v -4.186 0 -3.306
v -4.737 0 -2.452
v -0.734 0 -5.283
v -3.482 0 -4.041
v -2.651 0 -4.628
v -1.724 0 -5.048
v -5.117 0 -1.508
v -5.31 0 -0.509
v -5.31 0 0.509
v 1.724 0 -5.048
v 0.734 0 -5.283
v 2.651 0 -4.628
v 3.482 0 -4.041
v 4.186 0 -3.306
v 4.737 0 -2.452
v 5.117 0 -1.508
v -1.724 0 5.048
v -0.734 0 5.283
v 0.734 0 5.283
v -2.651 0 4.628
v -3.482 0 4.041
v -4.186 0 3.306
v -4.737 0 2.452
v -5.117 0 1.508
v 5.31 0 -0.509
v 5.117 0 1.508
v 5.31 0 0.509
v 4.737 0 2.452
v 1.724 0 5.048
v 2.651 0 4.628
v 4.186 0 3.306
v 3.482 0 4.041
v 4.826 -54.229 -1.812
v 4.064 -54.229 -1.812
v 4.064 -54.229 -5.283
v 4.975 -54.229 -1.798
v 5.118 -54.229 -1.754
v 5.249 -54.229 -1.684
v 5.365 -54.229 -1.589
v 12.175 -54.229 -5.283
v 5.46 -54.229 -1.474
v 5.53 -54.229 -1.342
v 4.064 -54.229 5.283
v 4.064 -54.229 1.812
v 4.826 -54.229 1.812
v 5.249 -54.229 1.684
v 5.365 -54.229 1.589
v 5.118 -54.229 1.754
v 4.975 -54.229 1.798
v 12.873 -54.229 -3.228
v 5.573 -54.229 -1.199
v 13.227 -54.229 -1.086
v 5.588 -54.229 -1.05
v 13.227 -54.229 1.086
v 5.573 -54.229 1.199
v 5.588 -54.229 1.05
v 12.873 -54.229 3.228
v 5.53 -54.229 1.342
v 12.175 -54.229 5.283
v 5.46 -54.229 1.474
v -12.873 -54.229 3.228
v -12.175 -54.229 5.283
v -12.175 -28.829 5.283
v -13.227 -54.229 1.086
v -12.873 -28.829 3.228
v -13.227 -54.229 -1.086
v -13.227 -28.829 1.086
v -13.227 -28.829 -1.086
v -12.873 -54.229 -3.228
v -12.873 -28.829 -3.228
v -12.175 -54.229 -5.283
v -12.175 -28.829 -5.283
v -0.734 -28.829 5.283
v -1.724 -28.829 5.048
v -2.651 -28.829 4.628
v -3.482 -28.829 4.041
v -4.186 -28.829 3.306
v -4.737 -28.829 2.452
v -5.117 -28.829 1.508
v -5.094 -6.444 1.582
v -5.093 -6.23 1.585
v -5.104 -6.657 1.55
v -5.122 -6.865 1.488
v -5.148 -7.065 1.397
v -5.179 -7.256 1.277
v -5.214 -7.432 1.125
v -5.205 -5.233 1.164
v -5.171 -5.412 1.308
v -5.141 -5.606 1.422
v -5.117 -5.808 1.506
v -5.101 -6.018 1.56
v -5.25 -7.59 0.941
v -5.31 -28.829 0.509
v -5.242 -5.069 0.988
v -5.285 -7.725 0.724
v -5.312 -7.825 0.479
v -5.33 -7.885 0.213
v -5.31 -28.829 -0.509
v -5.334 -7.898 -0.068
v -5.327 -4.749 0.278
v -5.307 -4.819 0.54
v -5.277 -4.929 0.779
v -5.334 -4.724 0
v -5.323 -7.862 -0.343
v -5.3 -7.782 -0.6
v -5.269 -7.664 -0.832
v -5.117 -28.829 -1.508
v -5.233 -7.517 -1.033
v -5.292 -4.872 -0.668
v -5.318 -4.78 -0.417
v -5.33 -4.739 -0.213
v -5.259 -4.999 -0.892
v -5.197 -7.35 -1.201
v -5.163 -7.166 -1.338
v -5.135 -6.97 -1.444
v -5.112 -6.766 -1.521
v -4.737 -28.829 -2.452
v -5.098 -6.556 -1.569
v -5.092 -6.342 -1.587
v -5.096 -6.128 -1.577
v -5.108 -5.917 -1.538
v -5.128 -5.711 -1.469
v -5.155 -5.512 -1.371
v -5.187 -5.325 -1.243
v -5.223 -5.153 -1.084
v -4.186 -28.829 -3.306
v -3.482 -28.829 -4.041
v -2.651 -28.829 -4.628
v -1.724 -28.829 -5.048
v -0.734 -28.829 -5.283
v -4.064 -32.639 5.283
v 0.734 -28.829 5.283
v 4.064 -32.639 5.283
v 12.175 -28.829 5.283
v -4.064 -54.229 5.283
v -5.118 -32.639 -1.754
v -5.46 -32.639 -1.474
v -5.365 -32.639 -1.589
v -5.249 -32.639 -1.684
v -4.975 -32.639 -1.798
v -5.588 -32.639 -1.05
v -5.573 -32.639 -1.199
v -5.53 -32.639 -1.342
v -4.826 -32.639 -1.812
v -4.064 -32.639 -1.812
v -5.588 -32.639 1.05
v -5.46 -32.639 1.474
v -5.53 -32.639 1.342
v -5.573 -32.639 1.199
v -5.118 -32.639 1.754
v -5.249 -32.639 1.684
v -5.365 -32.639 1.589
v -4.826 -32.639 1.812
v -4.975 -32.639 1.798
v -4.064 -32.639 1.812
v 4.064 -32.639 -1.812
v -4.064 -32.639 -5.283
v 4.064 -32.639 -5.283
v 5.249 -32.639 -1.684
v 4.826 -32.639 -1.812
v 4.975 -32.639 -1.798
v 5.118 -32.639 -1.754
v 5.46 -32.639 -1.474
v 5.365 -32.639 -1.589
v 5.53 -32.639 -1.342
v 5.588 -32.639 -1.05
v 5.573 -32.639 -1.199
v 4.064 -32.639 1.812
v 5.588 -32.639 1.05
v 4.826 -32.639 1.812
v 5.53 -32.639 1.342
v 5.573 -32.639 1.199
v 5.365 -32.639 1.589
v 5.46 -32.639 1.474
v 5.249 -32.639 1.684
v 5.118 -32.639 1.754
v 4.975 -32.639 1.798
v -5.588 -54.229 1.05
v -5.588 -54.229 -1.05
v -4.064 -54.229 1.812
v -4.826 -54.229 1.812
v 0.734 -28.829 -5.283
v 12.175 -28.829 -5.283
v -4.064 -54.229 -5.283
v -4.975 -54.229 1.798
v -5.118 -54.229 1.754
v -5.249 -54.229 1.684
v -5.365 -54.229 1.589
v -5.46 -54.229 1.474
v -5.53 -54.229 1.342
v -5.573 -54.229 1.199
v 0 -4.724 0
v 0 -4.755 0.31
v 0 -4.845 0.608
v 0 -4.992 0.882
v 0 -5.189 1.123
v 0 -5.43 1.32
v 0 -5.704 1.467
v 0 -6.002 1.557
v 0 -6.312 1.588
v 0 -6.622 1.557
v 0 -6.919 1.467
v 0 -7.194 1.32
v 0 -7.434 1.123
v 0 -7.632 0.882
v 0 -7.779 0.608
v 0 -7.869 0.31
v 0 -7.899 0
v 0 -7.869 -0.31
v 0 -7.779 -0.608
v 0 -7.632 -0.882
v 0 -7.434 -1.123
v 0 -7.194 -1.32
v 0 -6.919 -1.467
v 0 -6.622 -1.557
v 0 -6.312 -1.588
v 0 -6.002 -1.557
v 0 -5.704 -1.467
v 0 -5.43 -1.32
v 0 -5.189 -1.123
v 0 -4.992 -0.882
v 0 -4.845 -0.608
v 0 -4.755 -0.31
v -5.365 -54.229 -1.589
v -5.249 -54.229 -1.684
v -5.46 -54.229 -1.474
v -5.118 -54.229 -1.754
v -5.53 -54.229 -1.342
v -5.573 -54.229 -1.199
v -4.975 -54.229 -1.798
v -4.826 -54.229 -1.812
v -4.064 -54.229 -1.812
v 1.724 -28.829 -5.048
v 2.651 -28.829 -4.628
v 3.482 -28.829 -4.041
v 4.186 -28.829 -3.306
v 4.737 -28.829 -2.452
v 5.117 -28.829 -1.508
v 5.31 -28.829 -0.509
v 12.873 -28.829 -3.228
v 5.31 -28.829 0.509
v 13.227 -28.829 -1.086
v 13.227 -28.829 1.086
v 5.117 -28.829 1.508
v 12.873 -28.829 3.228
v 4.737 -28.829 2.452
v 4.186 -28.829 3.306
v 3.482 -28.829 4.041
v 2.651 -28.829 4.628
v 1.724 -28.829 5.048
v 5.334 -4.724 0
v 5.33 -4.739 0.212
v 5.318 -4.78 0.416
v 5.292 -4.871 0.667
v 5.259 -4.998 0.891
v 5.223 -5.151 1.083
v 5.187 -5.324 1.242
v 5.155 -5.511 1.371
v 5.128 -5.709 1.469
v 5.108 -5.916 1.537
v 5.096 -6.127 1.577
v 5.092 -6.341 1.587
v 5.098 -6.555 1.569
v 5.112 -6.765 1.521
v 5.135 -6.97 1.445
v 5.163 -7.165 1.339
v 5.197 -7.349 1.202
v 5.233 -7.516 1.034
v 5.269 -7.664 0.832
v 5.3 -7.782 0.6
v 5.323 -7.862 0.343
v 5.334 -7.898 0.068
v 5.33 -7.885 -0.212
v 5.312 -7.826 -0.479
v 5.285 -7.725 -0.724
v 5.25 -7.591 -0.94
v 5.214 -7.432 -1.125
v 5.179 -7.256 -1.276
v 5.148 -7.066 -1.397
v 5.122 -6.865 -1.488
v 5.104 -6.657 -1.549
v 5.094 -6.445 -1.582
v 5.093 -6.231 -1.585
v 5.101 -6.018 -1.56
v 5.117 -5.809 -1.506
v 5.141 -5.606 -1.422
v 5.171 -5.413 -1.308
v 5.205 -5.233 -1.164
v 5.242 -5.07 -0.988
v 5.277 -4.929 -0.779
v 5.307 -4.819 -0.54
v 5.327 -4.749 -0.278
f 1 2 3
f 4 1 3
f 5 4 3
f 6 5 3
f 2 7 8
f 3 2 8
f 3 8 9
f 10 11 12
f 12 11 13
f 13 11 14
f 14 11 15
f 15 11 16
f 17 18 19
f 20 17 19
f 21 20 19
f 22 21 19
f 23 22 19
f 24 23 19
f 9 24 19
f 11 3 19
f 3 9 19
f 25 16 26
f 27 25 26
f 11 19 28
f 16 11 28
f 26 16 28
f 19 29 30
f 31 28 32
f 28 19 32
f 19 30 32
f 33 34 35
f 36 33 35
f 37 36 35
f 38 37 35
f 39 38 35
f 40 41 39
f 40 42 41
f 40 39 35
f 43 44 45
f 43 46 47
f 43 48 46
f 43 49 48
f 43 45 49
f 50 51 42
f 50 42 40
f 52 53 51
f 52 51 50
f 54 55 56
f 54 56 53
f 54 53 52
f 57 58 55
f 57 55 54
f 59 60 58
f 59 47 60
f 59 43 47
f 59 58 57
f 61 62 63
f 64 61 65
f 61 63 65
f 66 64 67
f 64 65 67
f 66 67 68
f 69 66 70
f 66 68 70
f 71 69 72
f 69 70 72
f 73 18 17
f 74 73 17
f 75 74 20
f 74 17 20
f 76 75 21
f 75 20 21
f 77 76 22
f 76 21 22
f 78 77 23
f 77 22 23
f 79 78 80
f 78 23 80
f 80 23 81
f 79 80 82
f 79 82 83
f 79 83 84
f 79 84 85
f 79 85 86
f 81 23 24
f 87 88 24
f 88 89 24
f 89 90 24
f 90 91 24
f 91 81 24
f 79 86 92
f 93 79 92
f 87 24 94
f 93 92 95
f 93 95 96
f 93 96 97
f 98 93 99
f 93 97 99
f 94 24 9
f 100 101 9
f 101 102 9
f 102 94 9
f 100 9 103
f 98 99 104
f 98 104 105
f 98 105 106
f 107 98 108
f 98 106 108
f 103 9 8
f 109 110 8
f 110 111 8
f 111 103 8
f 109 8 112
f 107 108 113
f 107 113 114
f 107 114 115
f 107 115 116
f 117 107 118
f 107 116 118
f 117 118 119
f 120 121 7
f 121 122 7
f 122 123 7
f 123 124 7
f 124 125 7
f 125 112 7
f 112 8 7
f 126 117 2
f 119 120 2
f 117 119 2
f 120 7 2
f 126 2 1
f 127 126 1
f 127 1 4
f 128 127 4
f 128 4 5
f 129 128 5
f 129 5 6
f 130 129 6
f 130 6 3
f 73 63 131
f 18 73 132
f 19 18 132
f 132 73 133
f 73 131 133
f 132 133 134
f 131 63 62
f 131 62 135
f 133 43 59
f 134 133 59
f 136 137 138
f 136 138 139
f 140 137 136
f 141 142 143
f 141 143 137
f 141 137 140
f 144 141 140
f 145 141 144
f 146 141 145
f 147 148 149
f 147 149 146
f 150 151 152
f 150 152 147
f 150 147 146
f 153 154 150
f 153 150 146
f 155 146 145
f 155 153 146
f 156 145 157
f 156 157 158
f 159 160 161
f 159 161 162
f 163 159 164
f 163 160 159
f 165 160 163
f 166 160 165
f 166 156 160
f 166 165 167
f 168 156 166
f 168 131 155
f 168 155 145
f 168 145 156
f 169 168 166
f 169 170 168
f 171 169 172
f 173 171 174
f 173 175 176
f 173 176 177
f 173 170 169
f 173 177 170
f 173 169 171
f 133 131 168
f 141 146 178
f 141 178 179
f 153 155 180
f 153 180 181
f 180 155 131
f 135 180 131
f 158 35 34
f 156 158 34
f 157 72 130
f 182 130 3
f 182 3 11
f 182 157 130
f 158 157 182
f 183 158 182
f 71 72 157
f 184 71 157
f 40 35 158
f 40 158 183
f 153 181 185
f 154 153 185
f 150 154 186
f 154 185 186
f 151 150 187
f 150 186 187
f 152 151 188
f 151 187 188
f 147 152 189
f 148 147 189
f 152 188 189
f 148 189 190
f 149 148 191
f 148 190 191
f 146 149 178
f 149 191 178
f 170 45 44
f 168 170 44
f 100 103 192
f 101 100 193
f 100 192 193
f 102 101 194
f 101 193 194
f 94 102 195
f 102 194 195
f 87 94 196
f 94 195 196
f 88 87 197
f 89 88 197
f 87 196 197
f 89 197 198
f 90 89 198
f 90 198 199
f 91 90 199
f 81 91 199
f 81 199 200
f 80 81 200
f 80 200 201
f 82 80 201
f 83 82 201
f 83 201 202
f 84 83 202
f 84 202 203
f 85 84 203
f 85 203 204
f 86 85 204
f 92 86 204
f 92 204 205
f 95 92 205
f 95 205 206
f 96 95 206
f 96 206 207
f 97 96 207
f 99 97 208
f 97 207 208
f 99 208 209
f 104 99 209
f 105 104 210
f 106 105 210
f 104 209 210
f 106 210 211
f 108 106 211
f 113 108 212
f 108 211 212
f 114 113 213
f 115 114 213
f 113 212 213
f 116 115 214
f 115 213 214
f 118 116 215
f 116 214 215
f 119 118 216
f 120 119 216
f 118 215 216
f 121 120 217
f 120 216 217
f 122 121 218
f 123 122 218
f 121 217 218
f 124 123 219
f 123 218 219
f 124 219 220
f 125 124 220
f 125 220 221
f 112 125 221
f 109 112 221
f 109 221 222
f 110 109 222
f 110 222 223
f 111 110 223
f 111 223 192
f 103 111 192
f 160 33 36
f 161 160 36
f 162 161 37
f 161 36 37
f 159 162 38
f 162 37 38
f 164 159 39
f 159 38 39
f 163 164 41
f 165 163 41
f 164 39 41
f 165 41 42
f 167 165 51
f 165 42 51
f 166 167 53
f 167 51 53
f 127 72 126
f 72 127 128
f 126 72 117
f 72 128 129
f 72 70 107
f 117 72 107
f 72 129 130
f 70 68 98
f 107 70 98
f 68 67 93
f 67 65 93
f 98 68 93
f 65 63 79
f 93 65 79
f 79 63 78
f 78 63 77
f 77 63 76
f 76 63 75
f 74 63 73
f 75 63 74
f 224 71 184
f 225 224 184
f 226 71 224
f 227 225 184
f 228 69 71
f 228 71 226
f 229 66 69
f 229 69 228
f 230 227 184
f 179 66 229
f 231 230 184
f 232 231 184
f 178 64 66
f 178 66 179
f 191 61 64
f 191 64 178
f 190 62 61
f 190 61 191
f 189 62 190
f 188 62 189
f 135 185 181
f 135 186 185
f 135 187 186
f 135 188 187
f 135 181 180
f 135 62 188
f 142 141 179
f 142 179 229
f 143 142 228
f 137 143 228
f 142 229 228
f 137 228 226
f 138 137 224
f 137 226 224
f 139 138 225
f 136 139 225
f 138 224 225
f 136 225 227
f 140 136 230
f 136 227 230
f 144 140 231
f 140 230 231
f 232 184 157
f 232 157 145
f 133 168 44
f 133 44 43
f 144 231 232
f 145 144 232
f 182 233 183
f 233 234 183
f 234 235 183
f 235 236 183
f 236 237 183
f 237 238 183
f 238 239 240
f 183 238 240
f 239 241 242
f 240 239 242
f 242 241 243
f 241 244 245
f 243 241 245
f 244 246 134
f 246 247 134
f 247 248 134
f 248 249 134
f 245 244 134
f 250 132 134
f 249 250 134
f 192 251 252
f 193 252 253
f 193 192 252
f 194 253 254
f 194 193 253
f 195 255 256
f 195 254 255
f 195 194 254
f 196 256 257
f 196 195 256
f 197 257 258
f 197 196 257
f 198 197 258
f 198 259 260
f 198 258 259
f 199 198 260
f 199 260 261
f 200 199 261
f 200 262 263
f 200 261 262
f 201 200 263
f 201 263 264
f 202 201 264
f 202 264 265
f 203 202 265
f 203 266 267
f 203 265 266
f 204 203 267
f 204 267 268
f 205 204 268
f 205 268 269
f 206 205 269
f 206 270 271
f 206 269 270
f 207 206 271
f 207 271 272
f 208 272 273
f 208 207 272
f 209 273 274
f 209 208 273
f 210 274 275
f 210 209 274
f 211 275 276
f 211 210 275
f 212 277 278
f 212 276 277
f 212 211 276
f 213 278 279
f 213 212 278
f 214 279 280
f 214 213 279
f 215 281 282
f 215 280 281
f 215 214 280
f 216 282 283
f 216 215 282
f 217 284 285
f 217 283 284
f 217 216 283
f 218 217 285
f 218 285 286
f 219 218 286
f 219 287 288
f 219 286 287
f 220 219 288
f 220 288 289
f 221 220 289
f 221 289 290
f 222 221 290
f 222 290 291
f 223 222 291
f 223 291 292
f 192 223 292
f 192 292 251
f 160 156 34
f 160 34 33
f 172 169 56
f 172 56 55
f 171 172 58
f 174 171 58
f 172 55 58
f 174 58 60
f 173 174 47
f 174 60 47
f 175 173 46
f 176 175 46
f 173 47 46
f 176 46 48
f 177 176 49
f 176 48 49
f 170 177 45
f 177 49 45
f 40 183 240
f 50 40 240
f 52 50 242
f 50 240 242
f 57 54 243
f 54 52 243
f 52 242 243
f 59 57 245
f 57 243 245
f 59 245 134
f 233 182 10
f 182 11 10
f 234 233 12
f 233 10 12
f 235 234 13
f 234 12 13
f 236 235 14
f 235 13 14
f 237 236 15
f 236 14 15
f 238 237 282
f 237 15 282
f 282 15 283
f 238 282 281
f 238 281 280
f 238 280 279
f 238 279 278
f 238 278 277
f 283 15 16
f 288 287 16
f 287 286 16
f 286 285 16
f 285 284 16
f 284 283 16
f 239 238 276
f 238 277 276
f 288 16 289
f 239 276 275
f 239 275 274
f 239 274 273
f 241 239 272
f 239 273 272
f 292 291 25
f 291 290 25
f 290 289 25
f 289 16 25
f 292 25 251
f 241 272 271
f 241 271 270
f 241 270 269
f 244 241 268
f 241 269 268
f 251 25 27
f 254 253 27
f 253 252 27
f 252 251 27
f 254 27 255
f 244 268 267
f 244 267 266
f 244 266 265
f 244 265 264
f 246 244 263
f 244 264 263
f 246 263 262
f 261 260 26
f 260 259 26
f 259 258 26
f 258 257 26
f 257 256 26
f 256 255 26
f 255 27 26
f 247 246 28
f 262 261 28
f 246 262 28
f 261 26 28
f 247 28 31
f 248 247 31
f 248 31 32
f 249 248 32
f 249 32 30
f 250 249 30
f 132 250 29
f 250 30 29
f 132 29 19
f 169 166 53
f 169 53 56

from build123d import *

# Parameters (mm, degrees)
F0_R           = 5.334
F1_DEPTH       = 28.829
F2_R           = 13.271737
F3_DEPTH       = 25.4
F4_W           = 26.543474
F4_H           = 10.5664
F5_DEPTH       = 54.229
F6_W           = 8.128
F6_H           = 10.5664
F7_DEPTH       = 21.59
F9_DEPTH       = 21.59
F10_DEPTH      = 21.59
F11_R          = 1.5875
F12_DEPTH      = 5.334
F12_DEPTH_BACK = 5.334


with BuildPart() as f1:
    # F0 (on Front) → F1 (new body)
    with BuildSketch(Plane.XZ):
        Circle(F0_R)
    extrude(amount=F1_DEPTH)

    # F2 (on face) → F3 (join)
    with BuildSketch(Plane.XZ.offset(28.829)):
        Circle(F2_R)
    extrude(amount=F3_DEPTH)

    # F4 (on face) → F5 (intersect, through all)
    with BuildSketch(Plane.XZ.offset(54.229)):
        Rectangle(F4_W, F4_H)
    extrude(amount=-F5_DEPTH, mode=Mode.INTERSECT)

    # F6 (on face) → F7 (cut)
    with BuildSketch(Plane.XZ.offset(54.229)):
        Rectangle(F6_W, F6_H)
    extrude(amount=-F7_DEPTH, mode=Mode.SUBTRACT)

    # F8 (on face) → F9 (cut)
    with BuildSketch(Plane.XZ.offset(54.229)):
        with BuildLine():
            Line((4.826, 1.812324), (-4.826, 1.812324))
            ThreePointArc((-4.826, 1.812324), (-5.364815, 1.58914), (-5.588, 1.050324))
            Line((-5.588, 1.050324), (-5.588, -1.050324))
            ThreePointArc((-5.588, -1.050324), (-5.364815, -1.58914), (-4.826, -1.812324))
            Line((-4.826, -1.812324), (4.826, -1.812324))
            ThreePointArc((4.826, -1.812324), (5.364815, -1.58914), (5.588, -1.050324))
            Line((5.588, -1.050324), (5.588, 1.050324))
            ThreePointArc((5.588, 1.050324), (5.364815, 1.58914), (4.826, 1.812324))
        make_face()
    extrude(amount=-F9_DEPTH, mode=Mode.SUBTRACT)

    # F8 (on face) → F10 (cut)
    with BuildSketch(Plane.XZ.offset(54.229)):
        with BuildLine():
            Line((4.826, 1.812324), (-4.826, 1.812324))
            ThreePointArc((-4.826, 1.812324), (-5.364815, 1.58914), (-5.588, 1.050324))
            Line((-5.588, 1.050324), (-5.588, -1.050324))
            ThreePointArc((-5.588, -1.050324), (-5.364815, -1.58914), (-4.826, -1.812324))
            Line((-4.826, -1.812324), (4.826, -1.812324))
            ThreePointArc((4.826, -1.812324), (5.364815, -1.58914), (5.588, -1.050324))
            Line((5.588, -1.050324), (5.588, 1.050324))
            ThreePointArc((5.588, 1.050324), (5.364815, 1.58914), (4.826, 1.812324))
        make_face()
    extrude(amount=-F10_DEPTH, mode=Mode.SUBTRACT)

    # F11 (on Right) → F12 (cut, two sides)
    with BuildSketch(Plane.YZ) as f12_sk:
        with Locations((-6.3119, 0)):
            Circle(F11_R)
    extrude(amount=F12_DEPTH, mode=Mode.SUBTRACT)
    extrude(f12_sk.sketch, amount=-F12_DEPTH_BACK, mode=Mode.SUBTRACT)


solid = f1.part
